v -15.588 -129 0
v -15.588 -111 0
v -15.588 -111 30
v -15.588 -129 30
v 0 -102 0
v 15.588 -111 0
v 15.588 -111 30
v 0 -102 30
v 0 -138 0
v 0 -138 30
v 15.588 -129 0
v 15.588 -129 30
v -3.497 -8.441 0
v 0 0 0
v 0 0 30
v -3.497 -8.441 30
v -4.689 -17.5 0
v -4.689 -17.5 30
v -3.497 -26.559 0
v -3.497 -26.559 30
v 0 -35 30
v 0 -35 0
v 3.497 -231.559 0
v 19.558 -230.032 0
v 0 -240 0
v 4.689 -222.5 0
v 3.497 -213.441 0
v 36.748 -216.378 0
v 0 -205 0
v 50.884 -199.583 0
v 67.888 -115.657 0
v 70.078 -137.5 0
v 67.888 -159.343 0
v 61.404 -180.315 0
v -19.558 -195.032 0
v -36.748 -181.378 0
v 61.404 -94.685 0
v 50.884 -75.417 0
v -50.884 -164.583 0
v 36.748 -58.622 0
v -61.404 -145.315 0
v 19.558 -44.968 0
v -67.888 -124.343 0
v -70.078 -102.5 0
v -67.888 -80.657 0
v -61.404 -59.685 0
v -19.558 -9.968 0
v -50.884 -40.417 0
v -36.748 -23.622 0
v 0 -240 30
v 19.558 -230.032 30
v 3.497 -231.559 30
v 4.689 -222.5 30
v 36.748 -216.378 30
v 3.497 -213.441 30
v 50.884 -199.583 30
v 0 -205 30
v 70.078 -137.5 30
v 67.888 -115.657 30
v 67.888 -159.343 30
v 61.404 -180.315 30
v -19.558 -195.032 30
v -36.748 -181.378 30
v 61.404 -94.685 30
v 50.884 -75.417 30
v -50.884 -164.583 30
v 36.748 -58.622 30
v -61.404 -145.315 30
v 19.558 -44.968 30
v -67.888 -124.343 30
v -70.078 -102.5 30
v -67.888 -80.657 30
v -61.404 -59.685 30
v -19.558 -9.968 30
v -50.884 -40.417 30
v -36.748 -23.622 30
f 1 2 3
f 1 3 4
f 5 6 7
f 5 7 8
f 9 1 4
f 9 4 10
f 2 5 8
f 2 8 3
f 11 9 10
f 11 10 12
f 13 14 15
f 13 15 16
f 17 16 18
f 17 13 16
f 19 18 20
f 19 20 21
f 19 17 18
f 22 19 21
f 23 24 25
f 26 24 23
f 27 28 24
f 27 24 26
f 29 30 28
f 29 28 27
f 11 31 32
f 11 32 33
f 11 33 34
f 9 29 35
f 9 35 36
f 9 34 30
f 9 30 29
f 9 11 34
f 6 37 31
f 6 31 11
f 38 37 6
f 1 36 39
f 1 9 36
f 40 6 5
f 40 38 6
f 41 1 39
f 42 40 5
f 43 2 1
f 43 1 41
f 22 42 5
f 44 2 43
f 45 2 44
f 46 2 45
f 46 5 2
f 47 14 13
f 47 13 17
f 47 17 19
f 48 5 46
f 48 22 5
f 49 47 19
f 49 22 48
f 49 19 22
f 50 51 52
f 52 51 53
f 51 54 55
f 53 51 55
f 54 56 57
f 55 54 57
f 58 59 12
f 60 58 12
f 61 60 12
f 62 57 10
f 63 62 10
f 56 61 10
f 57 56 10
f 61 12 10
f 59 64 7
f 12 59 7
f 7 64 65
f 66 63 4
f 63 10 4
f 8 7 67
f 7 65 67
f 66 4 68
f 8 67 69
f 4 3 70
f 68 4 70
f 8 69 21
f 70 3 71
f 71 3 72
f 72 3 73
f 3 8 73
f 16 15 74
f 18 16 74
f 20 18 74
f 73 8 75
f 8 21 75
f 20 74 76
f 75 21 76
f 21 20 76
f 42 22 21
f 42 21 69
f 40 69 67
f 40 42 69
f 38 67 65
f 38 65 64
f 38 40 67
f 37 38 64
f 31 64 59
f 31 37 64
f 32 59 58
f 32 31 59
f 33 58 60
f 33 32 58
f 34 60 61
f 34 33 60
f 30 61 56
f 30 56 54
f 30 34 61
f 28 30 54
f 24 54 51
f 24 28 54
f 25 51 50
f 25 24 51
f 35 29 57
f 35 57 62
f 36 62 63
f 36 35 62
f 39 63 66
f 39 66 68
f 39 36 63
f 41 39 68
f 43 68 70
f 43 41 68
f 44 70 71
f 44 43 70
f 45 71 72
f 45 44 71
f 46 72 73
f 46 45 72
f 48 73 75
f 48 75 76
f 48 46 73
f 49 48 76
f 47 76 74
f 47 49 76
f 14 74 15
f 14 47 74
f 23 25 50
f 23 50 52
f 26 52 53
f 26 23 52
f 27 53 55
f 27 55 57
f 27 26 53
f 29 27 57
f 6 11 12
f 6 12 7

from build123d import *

# Parameters (mm, degrees)
BOSS_EXTRU_2_DEPTH      = 30
ENL_V_MAT_EXTRU_1_DEPTH = 252.815317877


with BuildPart() as part:
    # Esquisse1 → Boss.-Extru.2 (new body)
    with BuildSketch(Plane.XY):
        with BuildLine():
            ThreePointArc((0, -205), (-70.078201443, -102.5), (0, 0))
            ThreePointArc((0, 0), (-4.689110868, -17.5), (0, -35))
            ThreePointArc((0, -35), (70.078201443, -137.5), (0, -240))
            ThreePointArc((0, -240), (4.689110868, -222.5), (0, -205))
        make_face()
    extrude(amount=BOSS_EXTRU_2_DEPTH)

    # Esquisse2 → Enlèv. mat.-Extru.1 (cut, through all)
    with BuildSketch(Plane.XY.offset(30)):
        Polygon((15.588457268, -111), (0, -102), (-15.588457268, -111), (-15.588457268, -129), (0, -138), (15.588457268, -129), align=None)
    extrude(amount=-ENL_V_MAT_EXTRU_1_DEPTH, mode=Mode.SUBTRACT)


solid = part.part
